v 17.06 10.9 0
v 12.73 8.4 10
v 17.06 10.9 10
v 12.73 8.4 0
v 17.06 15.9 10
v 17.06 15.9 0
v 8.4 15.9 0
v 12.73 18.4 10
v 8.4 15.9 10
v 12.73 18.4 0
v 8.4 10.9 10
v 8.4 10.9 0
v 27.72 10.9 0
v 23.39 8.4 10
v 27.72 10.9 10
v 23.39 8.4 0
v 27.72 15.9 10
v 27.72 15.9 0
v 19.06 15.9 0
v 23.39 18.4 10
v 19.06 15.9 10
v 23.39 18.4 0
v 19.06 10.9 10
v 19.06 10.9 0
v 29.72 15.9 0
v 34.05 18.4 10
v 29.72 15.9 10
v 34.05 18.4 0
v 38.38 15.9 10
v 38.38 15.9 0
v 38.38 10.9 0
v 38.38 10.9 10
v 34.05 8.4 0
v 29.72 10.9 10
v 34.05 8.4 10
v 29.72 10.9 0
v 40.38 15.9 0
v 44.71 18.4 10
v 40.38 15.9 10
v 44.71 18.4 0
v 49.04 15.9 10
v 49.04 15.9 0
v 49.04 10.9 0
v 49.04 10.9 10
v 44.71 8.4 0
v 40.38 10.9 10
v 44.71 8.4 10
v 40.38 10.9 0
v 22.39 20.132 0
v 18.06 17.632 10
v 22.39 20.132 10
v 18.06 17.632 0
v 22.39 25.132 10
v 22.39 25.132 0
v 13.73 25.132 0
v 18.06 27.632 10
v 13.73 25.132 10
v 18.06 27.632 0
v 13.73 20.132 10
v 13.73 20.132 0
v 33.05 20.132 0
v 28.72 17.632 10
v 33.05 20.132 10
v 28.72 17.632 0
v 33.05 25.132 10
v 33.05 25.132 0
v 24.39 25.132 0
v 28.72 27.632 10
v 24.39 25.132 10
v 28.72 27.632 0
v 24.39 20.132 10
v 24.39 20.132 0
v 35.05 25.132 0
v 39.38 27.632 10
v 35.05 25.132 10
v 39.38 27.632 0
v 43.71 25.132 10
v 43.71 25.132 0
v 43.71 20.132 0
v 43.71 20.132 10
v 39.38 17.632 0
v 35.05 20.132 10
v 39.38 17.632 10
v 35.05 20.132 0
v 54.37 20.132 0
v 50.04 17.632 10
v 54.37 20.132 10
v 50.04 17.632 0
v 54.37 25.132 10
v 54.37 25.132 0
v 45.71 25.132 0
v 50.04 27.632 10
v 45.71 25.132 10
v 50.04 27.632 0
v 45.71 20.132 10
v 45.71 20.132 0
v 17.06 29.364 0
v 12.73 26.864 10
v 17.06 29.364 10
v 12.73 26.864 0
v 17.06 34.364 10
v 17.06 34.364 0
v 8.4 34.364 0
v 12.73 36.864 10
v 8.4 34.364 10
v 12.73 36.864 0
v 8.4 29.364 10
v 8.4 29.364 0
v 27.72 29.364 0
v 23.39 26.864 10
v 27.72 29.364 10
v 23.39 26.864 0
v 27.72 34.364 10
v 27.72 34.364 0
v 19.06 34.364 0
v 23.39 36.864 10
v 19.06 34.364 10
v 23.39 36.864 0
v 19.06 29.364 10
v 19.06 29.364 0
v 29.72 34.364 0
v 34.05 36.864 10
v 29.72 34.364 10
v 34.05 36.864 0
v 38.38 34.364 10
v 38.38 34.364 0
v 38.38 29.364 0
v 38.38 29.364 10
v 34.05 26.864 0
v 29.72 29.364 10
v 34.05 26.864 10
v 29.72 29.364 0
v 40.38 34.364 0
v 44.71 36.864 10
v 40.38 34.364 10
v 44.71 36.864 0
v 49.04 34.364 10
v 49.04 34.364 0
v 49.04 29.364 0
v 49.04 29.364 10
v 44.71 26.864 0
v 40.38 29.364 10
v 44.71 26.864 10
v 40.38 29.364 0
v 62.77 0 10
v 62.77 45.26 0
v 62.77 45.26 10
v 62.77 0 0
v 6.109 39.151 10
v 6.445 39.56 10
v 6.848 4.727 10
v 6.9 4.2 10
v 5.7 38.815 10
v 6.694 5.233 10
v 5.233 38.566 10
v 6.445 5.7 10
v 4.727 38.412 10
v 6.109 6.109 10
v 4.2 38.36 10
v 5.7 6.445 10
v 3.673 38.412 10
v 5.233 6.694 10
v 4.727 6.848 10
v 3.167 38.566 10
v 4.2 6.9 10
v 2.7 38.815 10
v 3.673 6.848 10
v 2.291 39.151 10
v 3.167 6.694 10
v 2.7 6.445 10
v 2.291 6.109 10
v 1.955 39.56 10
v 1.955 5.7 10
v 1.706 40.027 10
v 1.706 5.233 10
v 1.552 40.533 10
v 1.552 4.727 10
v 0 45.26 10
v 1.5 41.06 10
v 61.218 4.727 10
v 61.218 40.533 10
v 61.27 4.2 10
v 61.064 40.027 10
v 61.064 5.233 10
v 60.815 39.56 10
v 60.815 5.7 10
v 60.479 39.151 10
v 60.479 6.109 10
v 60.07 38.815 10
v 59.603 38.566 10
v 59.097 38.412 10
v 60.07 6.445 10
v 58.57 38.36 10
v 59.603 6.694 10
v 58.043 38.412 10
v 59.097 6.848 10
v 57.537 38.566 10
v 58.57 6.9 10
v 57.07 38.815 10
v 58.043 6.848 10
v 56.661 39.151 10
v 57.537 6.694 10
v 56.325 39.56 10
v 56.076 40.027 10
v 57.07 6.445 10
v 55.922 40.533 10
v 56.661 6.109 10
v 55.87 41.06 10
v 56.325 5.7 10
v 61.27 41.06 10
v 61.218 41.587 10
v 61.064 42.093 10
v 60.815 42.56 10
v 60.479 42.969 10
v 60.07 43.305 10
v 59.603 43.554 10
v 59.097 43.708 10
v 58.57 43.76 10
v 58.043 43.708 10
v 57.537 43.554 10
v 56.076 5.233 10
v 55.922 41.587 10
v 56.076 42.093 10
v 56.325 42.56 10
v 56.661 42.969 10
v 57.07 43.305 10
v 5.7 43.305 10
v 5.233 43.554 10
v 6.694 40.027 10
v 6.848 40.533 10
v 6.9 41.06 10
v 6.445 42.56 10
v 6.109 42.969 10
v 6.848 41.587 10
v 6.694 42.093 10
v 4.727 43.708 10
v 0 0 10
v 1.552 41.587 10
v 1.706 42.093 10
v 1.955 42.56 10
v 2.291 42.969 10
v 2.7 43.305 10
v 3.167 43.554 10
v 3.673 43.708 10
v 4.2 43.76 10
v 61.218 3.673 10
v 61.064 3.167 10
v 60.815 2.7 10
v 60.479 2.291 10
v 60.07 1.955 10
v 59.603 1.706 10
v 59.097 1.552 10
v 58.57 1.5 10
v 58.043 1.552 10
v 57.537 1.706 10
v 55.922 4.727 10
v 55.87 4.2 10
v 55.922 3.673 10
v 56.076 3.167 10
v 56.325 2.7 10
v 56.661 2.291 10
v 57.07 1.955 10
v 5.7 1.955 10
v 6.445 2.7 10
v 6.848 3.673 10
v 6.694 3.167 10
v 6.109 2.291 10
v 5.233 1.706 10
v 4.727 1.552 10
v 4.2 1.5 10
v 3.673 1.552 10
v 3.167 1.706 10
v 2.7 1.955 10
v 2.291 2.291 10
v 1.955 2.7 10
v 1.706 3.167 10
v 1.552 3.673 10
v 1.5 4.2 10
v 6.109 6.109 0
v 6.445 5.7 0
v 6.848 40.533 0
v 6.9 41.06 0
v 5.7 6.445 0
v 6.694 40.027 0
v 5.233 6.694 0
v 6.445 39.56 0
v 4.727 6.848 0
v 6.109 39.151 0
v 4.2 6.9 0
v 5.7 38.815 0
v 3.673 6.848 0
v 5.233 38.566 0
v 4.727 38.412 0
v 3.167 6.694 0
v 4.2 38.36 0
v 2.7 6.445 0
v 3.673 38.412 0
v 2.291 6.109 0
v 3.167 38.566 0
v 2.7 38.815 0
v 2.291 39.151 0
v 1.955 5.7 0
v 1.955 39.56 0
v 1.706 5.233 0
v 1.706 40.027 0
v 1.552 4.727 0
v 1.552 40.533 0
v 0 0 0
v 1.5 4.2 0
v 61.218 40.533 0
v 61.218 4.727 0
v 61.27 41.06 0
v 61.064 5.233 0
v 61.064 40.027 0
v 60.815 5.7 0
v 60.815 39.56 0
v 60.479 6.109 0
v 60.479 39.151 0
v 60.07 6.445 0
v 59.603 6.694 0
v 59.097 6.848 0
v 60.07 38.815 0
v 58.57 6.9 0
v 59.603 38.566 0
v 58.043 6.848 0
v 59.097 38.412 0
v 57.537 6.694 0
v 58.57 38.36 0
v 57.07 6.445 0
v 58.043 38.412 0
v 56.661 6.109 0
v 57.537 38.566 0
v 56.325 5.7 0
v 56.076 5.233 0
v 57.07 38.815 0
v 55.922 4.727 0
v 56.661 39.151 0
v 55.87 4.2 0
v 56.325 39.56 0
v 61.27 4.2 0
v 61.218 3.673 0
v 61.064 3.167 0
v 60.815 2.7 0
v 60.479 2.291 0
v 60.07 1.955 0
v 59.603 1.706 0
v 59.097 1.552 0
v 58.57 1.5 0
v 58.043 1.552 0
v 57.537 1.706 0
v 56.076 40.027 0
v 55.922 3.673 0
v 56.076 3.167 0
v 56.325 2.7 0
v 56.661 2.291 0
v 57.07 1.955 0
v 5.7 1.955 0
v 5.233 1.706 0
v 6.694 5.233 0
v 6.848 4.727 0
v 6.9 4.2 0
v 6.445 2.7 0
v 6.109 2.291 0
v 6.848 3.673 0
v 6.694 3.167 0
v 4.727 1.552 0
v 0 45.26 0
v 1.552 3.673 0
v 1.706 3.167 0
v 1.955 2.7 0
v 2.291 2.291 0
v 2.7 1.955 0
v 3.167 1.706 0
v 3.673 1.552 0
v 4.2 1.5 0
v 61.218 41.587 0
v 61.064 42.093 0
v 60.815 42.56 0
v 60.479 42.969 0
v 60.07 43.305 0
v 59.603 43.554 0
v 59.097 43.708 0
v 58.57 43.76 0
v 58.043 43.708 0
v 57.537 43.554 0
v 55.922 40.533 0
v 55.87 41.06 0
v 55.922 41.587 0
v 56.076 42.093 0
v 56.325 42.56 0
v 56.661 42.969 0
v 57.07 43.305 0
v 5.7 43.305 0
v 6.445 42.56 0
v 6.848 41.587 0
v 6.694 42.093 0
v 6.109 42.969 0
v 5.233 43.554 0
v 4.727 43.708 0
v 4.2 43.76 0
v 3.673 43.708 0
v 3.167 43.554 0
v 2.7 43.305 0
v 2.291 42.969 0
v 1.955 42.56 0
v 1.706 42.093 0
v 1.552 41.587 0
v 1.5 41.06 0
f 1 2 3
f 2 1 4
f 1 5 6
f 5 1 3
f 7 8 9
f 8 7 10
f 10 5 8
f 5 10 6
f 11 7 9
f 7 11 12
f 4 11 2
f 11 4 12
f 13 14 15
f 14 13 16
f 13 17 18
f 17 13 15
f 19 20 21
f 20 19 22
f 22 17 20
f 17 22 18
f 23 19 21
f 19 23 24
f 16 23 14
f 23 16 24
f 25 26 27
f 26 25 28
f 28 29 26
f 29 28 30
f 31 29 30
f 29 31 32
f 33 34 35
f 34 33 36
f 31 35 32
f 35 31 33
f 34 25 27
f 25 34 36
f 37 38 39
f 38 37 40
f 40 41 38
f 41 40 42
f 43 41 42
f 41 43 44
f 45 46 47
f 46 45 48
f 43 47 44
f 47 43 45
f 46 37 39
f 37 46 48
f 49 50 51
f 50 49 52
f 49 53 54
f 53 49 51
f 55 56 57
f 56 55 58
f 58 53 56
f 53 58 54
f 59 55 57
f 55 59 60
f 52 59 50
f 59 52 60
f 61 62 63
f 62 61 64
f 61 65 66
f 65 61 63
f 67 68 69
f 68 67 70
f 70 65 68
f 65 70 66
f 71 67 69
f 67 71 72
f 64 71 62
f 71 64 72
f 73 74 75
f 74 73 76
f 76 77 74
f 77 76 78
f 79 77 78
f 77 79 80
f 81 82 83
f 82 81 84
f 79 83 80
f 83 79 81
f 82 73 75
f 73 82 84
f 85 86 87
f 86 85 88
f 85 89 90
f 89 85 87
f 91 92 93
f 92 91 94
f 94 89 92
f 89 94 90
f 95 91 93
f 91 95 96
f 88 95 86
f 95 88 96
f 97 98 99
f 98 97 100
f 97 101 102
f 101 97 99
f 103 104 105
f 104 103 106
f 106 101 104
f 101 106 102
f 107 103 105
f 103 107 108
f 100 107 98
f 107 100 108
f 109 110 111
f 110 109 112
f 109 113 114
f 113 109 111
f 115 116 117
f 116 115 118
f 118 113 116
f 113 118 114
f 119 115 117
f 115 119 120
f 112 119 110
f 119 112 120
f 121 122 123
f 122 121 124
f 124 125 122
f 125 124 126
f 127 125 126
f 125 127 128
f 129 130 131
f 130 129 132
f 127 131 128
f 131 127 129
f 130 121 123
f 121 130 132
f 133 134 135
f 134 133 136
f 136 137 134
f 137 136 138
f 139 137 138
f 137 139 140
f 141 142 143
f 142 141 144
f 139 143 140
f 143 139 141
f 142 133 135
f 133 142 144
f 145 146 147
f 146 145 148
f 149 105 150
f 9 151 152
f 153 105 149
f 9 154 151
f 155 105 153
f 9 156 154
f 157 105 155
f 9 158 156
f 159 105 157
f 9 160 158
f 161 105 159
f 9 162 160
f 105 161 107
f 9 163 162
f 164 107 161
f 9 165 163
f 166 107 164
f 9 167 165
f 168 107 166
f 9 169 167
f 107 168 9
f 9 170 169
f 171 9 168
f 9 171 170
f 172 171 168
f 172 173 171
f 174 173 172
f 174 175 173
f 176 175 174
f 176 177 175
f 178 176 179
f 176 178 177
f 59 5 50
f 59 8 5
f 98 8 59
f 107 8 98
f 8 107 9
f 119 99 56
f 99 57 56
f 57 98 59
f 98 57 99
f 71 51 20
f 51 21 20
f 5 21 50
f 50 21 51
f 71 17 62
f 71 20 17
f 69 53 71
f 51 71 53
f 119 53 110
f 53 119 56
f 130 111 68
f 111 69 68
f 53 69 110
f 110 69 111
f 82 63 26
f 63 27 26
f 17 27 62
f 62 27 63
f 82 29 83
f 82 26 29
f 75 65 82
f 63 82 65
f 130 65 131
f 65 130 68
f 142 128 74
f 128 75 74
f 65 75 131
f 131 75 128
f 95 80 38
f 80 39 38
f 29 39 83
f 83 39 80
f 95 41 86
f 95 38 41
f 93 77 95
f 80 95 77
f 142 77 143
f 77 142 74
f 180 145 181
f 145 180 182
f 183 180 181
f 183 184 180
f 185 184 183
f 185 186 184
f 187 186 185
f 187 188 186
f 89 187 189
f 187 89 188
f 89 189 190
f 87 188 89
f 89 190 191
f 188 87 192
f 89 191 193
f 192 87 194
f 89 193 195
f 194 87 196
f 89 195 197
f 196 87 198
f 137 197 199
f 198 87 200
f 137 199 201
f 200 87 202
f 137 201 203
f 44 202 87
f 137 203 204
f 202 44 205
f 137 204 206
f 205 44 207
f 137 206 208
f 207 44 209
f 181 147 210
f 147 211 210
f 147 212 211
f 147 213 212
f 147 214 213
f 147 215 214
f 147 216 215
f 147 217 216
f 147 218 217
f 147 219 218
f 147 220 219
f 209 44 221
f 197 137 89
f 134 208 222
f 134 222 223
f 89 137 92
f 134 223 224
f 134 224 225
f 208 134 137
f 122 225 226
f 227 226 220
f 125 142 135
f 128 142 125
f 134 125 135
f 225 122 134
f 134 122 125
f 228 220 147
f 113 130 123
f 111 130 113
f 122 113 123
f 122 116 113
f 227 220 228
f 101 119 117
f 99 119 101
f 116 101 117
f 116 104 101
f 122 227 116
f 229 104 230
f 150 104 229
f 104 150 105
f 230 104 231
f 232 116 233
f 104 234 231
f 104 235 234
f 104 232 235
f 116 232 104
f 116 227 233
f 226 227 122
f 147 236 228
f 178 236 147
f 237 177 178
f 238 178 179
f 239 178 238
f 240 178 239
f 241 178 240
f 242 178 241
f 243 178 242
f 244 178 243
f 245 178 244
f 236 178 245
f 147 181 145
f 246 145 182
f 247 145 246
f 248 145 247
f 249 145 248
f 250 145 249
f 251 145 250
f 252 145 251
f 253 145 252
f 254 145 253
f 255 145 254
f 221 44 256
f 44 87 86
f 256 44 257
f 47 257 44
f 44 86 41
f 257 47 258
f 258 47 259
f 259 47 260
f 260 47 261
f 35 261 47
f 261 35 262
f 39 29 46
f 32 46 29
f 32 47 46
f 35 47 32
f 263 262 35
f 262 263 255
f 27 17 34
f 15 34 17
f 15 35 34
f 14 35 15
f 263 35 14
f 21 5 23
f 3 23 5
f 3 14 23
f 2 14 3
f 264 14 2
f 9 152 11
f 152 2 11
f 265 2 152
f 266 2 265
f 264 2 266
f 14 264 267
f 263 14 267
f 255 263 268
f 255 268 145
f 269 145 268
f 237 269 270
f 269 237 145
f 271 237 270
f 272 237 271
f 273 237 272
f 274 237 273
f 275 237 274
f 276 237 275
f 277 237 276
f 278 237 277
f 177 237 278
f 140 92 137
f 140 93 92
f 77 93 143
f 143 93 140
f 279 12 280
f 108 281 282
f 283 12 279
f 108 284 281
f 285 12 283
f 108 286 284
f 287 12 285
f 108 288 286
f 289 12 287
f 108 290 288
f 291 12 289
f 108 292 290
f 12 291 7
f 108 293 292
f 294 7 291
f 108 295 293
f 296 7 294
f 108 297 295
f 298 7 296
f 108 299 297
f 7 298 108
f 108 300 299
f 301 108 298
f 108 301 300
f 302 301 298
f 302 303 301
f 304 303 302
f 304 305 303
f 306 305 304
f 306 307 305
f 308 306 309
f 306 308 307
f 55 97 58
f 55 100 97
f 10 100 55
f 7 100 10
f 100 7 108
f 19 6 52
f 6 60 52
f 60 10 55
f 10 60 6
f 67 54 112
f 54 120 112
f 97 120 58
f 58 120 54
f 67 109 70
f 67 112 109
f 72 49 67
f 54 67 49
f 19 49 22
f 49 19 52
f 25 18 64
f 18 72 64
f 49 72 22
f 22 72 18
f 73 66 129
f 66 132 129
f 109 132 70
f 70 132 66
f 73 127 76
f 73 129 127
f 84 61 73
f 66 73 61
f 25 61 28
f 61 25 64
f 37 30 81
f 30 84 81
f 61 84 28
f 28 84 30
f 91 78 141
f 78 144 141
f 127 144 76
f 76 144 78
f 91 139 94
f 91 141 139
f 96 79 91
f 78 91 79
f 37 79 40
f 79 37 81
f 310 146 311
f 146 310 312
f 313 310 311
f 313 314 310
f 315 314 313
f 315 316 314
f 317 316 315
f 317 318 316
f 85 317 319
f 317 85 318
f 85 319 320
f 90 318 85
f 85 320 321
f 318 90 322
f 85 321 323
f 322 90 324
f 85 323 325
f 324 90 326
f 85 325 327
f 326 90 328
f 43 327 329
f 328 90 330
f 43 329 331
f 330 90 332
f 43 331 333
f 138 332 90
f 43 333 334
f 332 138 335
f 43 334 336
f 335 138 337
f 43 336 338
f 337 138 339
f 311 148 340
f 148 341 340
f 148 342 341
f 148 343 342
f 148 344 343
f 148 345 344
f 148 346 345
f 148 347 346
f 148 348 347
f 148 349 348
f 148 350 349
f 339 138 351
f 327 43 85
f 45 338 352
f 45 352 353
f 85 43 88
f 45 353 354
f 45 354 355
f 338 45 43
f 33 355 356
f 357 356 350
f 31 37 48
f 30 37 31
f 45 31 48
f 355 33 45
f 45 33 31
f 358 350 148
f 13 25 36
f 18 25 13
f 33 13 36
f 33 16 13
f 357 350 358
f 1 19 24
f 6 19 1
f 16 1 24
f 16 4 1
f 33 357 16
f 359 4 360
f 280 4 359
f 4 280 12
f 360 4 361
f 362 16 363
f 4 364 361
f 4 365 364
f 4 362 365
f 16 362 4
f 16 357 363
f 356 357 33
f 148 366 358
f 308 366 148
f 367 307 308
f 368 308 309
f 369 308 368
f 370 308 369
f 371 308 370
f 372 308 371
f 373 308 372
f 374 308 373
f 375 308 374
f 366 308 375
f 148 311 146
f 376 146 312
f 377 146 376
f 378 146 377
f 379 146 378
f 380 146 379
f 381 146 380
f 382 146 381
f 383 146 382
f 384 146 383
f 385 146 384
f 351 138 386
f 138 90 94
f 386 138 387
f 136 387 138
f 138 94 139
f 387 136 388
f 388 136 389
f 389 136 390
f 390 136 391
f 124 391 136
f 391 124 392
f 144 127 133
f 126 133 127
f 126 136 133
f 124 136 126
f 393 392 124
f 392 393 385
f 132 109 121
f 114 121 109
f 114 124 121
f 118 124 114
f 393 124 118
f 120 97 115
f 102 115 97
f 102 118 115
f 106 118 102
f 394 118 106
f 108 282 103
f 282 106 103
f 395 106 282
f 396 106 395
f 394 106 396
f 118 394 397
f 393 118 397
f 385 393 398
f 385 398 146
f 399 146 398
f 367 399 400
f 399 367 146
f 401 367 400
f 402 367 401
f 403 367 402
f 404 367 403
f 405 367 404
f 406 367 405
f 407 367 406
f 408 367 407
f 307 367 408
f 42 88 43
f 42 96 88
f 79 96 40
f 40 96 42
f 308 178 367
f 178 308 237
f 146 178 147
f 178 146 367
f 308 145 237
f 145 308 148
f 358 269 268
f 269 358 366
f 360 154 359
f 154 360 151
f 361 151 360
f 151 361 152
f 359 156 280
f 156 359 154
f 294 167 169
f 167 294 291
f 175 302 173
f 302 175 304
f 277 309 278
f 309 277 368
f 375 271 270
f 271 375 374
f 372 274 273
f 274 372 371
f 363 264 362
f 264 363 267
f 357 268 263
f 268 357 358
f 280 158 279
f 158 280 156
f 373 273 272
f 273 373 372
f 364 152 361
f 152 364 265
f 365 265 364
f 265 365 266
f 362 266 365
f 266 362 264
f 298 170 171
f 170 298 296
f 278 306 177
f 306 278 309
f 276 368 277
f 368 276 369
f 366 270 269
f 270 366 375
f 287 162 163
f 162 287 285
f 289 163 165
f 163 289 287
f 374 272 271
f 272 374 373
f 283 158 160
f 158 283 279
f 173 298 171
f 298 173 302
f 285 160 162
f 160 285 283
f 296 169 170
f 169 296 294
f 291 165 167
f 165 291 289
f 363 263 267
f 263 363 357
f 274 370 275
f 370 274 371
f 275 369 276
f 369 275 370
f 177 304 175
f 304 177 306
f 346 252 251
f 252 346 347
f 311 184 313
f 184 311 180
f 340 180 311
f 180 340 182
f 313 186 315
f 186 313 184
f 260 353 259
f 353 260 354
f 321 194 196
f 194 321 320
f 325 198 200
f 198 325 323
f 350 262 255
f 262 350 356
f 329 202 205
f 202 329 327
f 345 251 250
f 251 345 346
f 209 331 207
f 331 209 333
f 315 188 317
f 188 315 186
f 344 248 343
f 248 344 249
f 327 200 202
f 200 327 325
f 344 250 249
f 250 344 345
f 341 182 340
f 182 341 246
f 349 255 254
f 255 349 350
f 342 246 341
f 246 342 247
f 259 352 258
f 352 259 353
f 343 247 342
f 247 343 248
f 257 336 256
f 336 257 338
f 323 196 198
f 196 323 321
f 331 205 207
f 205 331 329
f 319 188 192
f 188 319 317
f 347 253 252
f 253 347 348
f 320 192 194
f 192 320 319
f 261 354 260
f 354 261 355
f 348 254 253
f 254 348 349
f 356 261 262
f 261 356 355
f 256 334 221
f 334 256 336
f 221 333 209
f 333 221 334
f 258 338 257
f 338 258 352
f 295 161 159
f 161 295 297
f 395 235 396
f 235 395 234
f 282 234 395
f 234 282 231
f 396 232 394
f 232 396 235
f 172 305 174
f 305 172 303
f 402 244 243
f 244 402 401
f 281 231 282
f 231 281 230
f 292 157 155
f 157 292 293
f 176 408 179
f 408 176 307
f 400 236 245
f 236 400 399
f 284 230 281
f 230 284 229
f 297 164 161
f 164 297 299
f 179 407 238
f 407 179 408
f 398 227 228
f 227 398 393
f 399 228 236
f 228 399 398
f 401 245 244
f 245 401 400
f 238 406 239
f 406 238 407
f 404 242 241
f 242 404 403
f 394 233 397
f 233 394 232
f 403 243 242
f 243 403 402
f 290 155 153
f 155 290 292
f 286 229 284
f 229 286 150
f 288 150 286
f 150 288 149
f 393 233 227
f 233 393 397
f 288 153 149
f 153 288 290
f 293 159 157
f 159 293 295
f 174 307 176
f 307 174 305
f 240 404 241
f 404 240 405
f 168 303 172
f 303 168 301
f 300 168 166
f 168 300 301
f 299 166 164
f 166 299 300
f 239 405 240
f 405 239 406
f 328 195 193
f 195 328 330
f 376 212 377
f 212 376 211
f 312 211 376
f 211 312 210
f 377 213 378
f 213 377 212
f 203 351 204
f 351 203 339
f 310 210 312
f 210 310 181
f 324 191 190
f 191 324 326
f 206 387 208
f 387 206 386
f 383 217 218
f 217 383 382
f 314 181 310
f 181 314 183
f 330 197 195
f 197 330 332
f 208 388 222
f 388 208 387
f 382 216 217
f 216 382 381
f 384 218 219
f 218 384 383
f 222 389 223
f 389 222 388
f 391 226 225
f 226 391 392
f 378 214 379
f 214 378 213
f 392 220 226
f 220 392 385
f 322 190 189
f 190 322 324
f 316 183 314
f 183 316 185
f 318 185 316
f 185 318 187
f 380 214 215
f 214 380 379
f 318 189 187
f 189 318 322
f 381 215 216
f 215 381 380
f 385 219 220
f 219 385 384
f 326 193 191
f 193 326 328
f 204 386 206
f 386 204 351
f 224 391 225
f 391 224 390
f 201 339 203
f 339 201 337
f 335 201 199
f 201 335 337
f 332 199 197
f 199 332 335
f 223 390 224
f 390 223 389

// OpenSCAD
$fn = 32;

// ----------------------------------------------------------------------
// Honeycomb panel: 62.77 x 45.26 mm, 12 cells of 10 mm
// ----------------------------------------------------------------------

// --- parameters (mm) ---
panel_w = 62.77;          // panel width
panel_d = 45.26;          // panel depth
thick = 10;               // panel thickness
cell_r = 5;               // hex cell circumradius
pitch = 10.66;            // hex cell pitch (centre to centre)
web = 2;                  // web between the cells
columns = 4;              // columns of cells
rows = 3;                 // rows of cells
cell_count = 12;          // total cells
shift_x = 12.73;          // first cell offset in x
shift_y = 13.4;           // first cell offset in y
mount_d = 5.4;            // corner mounting holes
hole_off = 4.2;           // mounting hole offset from the corners

difference() {
  union() {
    cube([panel_w, panel_d, thick]);
  }
  /* hexagonal cells, point-up, cut right through the plate */
  for (row = [0 : rows - 1]) {
    for (col = [0 : columns - 1]) {
      translate([shift_x + col * pitch + (row % 2) * pitch / 2, shift_y + row * pitch * 0.866025, -2.5]) rotate([0, 0, 30]) cylinder(h = thick + 5, d = 2 * cell_r, $fn = 6);
    }
  }
  /* corner mounting holes, clear of the outer cell web */
  translate([4.2, 4.2, -2.5]) cylinder(h = thick + 5, d = mount_d);
  translate([58.57, 4.2, -2.5]) cylinder(h = thick + 5, d = mount_d);
  translate([4.2, 41.06, -2.5]) cylinder(h = thick + 5, d = mount_d);
  translate([58.57, 41.06, -2.5]) cylinder(h = thick + 5, d = mount_d);
}
